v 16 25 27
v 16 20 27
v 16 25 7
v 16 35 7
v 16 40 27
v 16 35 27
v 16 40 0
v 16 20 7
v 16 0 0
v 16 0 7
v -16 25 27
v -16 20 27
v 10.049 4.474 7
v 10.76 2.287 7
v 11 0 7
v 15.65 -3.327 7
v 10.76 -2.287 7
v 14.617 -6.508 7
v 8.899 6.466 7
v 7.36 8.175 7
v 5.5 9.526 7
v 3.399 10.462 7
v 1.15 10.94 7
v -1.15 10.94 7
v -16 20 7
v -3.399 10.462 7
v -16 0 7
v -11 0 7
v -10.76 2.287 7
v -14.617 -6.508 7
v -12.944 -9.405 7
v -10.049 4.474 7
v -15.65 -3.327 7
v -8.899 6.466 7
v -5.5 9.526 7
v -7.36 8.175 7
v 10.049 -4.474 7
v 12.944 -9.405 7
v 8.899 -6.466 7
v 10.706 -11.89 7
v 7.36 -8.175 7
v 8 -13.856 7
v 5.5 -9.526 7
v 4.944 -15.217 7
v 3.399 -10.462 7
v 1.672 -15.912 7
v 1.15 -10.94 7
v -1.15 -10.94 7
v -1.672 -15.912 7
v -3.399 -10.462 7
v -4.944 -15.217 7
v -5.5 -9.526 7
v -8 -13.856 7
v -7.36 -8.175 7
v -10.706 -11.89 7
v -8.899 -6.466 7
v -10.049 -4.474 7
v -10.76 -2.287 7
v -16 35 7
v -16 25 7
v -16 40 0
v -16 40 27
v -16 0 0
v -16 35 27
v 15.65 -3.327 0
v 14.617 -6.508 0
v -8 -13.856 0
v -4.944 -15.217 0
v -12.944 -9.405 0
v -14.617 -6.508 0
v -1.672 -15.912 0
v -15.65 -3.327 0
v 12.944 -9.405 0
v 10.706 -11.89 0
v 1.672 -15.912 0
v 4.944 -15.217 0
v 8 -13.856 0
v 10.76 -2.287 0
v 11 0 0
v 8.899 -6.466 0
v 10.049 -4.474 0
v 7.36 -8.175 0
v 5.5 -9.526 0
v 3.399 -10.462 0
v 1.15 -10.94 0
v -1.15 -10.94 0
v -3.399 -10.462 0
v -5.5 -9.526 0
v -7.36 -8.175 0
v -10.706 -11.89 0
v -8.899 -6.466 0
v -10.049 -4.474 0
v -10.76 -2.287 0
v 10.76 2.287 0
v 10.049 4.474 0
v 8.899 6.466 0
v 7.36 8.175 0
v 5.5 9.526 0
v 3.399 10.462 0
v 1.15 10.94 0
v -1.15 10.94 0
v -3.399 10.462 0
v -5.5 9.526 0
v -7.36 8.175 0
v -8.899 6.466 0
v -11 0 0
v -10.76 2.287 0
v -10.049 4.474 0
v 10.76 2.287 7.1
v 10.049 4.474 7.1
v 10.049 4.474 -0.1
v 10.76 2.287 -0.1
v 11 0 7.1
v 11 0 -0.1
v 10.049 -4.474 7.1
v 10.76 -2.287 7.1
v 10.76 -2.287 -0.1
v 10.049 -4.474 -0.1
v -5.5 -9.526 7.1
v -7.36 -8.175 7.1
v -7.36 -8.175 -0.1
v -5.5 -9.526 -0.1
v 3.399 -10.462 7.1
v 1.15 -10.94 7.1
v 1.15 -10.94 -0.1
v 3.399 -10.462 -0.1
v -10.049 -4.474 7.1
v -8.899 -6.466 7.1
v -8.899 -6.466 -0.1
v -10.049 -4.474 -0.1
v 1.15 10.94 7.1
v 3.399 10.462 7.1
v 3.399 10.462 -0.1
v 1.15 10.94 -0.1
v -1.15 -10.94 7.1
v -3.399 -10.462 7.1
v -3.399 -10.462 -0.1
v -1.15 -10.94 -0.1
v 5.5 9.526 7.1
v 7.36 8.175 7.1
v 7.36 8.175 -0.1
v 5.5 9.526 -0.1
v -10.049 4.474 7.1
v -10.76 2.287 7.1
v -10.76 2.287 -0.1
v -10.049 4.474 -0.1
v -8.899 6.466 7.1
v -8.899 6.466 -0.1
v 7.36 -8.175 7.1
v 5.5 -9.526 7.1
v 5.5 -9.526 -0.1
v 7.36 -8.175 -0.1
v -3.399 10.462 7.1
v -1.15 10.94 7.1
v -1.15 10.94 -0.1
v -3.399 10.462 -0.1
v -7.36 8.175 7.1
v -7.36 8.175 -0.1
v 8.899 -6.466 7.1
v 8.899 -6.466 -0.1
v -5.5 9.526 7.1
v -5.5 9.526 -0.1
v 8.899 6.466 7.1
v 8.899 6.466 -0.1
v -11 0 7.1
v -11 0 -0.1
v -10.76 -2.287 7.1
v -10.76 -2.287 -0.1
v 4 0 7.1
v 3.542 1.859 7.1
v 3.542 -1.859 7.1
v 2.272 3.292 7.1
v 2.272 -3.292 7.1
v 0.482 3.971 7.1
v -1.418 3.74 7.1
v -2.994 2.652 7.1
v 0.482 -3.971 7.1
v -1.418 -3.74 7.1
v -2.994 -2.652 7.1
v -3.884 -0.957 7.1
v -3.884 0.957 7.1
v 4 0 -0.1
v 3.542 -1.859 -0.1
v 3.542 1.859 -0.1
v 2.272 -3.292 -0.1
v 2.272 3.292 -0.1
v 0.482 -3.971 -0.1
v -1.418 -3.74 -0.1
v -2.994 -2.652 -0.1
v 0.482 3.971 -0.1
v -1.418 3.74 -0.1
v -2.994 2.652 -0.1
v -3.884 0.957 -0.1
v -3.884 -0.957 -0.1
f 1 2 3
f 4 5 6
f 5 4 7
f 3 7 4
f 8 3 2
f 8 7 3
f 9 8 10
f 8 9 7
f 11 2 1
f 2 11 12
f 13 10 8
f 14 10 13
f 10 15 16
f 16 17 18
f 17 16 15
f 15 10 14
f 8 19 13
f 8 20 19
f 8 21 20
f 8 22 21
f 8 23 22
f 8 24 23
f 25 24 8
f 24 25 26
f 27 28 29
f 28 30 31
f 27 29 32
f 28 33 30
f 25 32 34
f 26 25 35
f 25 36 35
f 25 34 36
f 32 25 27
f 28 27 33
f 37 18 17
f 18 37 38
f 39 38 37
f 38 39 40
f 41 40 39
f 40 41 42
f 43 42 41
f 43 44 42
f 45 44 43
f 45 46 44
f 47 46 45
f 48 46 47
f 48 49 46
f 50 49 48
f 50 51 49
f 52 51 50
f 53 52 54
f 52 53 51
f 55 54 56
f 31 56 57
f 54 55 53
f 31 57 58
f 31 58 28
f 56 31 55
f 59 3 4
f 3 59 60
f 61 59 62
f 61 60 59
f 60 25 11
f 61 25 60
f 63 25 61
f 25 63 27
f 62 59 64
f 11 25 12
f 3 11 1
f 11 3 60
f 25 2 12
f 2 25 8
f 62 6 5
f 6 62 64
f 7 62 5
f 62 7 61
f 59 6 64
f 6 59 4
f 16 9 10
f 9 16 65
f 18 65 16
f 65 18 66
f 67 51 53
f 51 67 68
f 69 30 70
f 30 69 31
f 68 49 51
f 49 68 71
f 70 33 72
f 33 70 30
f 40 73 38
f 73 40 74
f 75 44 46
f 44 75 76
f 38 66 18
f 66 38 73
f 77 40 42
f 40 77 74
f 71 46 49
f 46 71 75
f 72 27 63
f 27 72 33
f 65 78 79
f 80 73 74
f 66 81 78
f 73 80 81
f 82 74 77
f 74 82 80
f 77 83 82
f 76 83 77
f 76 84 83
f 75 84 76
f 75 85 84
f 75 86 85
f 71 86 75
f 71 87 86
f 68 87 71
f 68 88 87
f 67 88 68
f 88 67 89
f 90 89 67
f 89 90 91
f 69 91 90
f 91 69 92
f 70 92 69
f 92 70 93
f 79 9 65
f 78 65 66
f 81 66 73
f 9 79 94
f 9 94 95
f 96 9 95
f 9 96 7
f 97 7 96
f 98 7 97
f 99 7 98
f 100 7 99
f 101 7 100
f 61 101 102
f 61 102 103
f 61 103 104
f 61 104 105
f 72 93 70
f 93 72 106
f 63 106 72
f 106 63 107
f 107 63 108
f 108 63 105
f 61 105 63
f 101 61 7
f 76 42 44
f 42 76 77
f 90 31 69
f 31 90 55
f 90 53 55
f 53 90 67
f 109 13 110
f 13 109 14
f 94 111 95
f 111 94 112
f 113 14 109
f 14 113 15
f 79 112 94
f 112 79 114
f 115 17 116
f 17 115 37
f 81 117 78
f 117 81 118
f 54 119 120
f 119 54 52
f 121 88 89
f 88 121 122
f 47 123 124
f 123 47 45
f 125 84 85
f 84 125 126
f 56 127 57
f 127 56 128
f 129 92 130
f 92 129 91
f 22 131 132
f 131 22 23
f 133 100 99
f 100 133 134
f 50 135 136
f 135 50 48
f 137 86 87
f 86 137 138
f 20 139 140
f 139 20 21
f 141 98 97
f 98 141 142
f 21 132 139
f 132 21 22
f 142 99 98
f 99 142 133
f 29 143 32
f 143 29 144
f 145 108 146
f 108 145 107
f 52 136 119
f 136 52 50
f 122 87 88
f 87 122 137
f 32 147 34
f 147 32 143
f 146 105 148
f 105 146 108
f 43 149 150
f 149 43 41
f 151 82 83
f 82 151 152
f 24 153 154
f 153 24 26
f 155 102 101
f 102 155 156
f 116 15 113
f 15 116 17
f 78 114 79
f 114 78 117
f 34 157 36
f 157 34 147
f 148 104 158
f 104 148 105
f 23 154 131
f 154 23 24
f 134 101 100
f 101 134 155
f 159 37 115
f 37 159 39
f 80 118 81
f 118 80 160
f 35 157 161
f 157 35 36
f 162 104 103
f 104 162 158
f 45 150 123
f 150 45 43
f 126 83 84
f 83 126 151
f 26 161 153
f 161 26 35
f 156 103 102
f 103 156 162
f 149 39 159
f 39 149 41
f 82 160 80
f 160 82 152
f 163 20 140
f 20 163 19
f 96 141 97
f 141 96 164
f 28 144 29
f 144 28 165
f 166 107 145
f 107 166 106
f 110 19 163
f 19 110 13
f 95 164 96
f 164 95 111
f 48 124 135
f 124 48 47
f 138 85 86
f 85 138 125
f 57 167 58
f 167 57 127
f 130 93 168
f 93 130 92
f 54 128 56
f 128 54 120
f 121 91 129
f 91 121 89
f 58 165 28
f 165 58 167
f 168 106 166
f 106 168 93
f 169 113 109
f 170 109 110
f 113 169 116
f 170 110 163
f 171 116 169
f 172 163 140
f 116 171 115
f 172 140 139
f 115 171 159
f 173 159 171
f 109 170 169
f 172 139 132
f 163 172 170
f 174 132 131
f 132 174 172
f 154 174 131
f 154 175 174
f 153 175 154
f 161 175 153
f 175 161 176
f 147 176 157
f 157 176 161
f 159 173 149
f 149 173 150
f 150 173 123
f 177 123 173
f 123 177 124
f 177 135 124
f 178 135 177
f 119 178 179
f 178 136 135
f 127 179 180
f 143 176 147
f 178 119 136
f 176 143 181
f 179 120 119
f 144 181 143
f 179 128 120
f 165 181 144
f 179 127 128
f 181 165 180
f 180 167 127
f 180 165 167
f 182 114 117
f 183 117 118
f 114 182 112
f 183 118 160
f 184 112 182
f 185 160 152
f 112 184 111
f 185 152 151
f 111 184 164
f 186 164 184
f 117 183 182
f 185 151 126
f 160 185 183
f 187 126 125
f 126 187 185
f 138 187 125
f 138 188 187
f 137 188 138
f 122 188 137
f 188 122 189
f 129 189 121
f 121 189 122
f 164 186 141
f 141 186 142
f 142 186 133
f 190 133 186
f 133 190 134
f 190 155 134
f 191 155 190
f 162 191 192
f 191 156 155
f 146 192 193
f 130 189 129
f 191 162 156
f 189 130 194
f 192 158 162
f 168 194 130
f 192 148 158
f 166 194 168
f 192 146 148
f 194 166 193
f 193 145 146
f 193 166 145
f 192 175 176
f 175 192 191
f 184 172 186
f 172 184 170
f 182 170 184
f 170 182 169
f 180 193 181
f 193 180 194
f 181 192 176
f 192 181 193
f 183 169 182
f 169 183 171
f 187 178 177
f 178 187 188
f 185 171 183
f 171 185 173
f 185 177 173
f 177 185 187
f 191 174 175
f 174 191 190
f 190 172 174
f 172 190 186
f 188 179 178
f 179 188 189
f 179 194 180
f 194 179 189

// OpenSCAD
BEARING_DIAMETER = 22;
BEARING_DEPTH = 7;
BEARING_INNER_HOLE = 8;
module bearing_mount() {
    beam_depth = 10;
    beam_width = 10;
	padding = 10;
	wall_thickness = 5;
	beam_width = 10;
    color("Green") {
		difference() {
			union() {
				cylinder(d = BEARING_DIAMETER + padding, h = BEARING_DEPTH);
				translate([-((BEARING_DIAMETER + padding) / 2), 0, 0])
					cube([BEARING_DIAMETER + padding, BEARING_DIAMETER + (padding * 2) - 2, BEARING_DEPTH]);
					translate([-(BEARING_DIAMETER + padding) / 2, (wall_thickness * 2) + padding, BEARING_DEPTH])
						makerbeam_wall_sling(wall_thickness, BEARING_DIAMETER + padding, beam_width, 2);
			}
			translate([0, 0, -(BEARING_DEPTH / 2)])
				cylinder(d = BEARING_DIAMETER, h = BEARING_DEPTH * 2);
		}
    }
}

module bearing_mount_base() {
}

module makerbeam_wall_sling(wall_thickness, width, gap, multiplier =1) {
	cube([width, wall_thickness, gap * multiplier]);
	translate([0, gap + wall_thickness, 0])
		cube([width, wall_thickness, gap * multiplier]);
}

module bearing_mount_with_bearing() {
	tollerance = 0.1;
	bearing_mount();
	color("Red") {
		difference() {
			translate([0, 0, -tollerance])
				cylinder(d = BEARING_DIAMETER, h = BEARING_DEPTH + (tollerance * 2));
			translate([0, 0, -(BEARING_DEPTH / 2)])
				cylinder(d = BEARING_INNER_HOLE, h = BEARING_DEPTH * 2);
		}
	}
}

bearing_mount_with_bearing();

bearing_mount();
